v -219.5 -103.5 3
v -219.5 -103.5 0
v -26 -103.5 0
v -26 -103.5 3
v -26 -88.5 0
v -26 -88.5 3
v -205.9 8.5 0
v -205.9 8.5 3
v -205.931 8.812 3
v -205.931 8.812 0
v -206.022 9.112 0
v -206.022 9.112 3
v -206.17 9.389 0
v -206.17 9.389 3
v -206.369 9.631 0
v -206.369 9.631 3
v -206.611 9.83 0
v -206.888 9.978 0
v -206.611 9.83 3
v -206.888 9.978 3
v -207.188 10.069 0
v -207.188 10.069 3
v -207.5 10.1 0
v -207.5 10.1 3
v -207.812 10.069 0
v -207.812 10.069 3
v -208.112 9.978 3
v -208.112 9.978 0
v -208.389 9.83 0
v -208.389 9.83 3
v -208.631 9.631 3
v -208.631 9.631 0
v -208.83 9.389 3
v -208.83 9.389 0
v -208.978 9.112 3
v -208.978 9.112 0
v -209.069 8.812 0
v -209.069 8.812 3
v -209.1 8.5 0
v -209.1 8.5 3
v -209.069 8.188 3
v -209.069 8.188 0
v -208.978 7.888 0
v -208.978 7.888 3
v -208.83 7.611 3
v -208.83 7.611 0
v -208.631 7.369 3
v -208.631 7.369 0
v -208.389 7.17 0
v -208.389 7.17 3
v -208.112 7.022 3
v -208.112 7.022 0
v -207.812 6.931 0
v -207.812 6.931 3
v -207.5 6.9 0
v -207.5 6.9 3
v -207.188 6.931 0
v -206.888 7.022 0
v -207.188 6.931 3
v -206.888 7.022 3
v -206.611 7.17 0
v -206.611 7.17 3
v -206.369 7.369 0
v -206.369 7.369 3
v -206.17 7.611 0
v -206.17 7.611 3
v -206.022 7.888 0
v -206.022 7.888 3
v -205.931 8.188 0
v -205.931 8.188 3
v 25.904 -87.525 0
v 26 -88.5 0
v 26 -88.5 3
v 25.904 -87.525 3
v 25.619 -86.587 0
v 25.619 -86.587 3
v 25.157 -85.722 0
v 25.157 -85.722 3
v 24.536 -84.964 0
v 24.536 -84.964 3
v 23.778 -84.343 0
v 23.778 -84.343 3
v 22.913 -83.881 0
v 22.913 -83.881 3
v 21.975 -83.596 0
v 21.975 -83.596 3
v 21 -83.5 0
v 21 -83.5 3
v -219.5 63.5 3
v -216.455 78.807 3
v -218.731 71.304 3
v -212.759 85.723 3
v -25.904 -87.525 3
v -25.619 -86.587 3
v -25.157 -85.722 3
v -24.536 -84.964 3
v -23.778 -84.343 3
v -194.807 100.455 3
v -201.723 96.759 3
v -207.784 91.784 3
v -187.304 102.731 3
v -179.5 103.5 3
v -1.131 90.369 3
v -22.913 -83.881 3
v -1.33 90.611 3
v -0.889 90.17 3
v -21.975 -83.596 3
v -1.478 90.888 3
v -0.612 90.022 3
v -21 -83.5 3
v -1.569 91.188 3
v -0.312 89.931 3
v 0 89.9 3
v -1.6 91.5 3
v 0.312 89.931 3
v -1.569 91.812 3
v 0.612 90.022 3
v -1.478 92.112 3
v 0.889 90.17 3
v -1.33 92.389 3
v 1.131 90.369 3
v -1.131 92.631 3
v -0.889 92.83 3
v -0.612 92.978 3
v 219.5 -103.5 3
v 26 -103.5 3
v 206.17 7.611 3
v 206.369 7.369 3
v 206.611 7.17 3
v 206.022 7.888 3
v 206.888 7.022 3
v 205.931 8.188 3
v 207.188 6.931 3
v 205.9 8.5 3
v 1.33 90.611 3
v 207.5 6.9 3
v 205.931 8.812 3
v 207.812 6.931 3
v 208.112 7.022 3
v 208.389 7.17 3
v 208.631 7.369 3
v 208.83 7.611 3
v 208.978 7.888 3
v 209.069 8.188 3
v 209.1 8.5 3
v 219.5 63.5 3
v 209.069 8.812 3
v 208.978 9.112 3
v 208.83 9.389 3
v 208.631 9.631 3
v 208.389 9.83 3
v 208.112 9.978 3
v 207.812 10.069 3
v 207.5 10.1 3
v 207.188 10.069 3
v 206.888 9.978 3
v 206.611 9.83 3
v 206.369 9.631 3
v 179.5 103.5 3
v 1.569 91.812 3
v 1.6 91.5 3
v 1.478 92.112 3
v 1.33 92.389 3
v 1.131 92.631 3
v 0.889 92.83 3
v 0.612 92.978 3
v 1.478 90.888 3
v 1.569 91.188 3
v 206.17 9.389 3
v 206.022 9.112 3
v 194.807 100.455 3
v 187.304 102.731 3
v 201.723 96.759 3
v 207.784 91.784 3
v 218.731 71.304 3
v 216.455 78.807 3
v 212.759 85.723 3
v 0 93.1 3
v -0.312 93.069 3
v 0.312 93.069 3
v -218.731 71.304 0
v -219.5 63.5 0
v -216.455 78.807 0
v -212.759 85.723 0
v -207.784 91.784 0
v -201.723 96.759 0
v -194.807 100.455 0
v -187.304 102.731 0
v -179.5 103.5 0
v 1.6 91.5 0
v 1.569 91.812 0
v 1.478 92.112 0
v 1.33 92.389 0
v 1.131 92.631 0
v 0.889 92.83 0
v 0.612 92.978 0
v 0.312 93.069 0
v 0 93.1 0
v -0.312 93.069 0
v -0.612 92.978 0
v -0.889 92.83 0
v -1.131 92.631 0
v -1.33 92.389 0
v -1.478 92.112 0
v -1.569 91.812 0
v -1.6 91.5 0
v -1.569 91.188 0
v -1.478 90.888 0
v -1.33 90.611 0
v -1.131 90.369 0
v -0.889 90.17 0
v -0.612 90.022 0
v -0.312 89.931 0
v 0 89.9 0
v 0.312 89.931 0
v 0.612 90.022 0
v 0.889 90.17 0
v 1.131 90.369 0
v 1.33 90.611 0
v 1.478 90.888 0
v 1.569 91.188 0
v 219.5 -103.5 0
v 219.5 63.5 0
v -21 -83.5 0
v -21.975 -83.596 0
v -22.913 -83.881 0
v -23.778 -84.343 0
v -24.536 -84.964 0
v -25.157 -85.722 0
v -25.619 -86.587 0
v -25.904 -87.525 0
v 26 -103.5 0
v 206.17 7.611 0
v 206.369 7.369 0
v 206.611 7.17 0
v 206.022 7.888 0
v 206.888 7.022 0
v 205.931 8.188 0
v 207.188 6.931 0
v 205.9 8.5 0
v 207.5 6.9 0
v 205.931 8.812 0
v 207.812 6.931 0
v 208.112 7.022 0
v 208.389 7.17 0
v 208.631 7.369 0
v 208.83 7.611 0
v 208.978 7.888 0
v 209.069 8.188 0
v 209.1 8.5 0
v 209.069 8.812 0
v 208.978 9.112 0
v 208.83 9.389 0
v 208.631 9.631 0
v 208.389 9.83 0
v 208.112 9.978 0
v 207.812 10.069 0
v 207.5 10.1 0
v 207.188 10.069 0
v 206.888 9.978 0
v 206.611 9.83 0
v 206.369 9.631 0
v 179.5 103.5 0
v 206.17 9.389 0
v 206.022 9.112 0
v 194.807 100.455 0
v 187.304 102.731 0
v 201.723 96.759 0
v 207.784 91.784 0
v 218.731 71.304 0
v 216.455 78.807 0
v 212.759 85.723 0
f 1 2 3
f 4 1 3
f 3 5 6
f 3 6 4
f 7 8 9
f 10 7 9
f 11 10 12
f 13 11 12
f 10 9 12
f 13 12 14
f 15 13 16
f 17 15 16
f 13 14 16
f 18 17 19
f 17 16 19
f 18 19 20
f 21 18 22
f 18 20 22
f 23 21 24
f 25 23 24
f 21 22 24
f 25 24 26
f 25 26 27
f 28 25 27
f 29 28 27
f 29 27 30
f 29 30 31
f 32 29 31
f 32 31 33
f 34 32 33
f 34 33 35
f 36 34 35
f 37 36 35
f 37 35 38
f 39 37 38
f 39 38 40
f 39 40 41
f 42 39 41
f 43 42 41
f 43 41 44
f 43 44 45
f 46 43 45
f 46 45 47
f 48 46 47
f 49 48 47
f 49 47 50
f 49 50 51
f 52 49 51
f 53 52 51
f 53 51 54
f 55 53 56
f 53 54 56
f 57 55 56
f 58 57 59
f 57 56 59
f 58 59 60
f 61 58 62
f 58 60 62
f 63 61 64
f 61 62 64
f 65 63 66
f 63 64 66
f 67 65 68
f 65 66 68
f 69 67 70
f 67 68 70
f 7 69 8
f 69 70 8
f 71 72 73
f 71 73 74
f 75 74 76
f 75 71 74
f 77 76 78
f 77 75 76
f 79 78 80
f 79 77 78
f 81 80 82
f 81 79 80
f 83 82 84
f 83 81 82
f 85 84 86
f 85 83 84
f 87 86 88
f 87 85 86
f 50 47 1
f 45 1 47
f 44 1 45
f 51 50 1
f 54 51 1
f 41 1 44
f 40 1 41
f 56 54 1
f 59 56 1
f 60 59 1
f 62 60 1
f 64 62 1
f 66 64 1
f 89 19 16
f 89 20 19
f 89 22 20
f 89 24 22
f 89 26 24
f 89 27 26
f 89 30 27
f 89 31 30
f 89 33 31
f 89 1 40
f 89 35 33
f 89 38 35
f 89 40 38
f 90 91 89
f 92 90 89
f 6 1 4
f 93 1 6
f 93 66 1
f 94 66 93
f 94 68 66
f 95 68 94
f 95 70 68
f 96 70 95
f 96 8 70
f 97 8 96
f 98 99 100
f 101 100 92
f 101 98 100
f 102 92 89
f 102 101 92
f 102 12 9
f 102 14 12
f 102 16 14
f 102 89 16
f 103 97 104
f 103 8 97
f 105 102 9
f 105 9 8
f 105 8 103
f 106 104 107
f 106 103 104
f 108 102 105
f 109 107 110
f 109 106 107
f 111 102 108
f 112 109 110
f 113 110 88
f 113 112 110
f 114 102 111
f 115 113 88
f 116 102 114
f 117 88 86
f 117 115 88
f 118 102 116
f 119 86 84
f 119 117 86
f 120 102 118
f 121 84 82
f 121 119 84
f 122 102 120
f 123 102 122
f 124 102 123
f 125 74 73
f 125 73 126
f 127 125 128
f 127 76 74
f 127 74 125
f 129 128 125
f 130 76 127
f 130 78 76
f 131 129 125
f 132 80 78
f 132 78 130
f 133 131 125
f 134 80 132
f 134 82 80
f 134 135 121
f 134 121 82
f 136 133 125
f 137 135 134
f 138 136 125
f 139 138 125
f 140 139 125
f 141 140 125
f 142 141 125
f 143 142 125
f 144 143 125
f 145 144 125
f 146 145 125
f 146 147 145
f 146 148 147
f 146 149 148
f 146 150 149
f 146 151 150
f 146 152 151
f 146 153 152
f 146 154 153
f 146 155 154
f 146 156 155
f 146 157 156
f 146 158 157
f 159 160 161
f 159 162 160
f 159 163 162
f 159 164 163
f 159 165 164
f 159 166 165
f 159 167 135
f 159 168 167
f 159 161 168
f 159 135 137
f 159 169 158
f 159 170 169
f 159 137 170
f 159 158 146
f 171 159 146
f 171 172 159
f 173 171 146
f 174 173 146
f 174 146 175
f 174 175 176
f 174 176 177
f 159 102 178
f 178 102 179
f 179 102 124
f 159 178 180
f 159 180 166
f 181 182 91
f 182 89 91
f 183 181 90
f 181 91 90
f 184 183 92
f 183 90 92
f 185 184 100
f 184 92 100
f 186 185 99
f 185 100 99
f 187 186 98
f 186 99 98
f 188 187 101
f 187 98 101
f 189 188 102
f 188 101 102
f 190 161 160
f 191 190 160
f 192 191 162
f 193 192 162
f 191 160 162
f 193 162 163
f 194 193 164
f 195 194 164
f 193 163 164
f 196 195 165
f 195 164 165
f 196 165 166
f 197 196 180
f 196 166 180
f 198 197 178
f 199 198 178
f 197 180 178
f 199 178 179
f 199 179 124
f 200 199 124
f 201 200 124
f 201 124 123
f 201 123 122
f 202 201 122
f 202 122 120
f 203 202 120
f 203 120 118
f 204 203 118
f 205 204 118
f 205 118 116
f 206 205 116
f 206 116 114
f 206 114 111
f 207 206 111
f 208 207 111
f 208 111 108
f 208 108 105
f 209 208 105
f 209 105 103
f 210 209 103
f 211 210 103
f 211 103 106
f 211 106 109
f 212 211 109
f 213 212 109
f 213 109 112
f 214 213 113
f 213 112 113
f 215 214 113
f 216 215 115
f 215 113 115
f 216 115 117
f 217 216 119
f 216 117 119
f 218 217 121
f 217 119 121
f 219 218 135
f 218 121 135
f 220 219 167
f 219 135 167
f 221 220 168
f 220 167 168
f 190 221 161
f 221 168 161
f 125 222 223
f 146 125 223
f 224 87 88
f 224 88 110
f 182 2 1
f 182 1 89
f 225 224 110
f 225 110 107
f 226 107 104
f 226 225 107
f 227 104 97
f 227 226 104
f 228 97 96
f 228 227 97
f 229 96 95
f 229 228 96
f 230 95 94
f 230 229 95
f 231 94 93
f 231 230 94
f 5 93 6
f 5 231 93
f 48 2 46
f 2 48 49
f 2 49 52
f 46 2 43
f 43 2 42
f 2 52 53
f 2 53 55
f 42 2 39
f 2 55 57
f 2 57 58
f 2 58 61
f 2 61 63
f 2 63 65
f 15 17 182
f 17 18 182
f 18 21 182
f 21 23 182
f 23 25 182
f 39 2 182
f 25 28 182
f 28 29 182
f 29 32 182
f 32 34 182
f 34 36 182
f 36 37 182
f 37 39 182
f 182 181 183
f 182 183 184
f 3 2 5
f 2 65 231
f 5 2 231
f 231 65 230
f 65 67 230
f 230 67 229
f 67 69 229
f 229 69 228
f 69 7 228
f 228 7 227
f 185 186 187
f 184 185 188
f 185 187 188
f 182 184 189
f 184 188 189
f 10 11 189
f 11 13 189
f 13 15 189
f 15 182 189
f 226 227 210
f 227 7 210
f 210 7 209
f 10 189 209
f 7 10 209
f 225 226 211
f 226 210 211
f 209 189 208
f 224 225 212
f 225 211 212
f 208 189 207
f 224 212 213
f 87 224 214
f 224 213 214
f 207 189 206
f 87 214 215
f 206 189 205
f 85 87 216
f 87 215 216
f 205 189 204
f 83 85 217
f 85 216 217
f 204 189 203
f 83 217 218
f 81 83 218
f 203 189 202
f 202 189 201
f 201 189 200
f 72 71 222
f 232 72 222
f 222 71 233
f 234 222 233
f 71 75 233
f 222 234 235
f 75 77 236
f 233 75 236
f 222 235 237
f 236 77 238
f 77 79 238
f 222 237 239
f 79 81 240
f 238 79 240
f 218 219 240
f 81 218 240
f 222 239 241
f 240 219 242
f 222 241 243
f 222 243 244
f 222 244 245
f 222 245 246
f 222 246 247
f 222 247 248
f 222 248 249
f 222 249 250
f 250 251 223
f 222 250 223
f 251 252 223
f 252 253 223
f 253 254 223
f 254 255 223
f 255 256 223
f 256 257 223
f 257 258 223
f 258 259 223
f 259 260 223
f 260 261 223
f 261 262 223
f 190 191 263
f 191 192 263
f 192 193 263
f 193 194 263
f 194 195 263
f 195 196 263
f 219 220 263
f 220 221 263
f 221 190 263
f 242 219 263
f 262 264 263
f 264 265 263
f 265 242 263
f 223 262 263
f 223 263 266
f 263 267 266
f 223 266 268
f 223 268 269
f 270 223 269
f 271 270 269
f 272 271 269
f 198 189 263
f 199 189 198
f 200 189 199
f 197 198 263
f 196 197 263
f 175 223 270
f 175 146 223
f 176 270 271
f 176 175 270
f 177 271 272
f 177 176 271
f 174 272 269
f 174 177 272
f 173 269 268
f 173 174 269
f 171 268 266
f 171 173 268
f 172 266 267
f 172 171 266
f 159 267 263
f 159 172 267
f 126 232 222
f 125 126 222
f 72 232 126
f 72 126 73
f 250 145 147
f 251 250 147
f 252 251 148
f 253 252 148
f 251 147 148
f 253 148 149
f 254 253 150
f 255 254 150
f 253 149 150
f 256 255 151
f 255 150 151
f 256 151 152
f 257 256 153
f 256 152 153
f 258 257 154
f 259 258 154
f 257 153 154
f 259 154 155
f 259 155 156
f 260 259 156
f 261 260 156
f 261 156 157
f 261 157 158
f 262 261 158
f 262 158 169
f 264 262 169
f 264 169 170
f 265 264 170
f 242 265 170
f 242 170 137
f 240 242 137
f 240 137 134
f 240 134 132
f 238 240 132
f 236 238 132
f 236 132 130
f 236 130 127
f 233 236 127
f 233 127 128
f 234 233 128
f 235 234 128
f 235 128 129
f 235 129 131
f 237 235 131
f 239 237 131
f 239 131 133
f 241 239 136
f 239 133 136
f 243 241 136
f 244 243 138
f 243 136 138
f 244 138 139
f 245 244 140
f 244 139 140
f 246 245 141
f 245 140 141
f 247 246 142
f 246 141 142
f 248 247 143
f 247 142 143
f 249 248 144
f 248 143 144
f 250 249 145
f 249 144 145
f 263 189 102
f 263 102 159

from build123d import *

# Parameters (mm, degrees)
SKETCH1_W           = 439
SKETCH1_H           = 207
BOSS_EXTRUDE1_DEPTH = 3
FILLET1_R           = 40
CUT_EXTRUDE1_DEPTH  = 243.696312292
SKETCH3_R           = 1.6
CUT_EXTRUDE2_DEPTH  = 243.696312292
SKETCH4_R           = 1.6
CUT_EXTRUDE3_DEPTH  = 243.696312292


with BuildPart() as part:
    # Sketch1 → Boss-Extrude1 (new body)
    with BuildSketch(Plane.XY):
        Rectangle(SKETCH1_W, SKETCH1_H)
    extrude(amount=BOSS_EXTRUDE1_DEPTH)

    # Fillet1
    fillet1_edges = [part.edges().sort_by_distance(p)[0] for p in [
        (-219.5, 103.5, 1.5),
        (219.5, 103.5, 1.5),
    ]]
    fillet(fillet1_edges, radius=FILLET1_R)

    # Sketch2 → Cut-Extrude1 (cut, through all)
    with BuildSketch(Plane(origin=(0, 0, 0), x_dir=(-1, 0, 0), z_dir=(0, 0, -1))):
        with BuildLine():
            Line((-21, -83.5), (21, -83.5))
            ThreePointArc((21, -83.5), (24.535533906, -84.964466094), (26, -88.5))
            Line((26, -88.5), (26, -103.5))
            Line((26, -103.5), (-26, -103.5))
            Line((-26, -103.5), (-26, -88.5))
            ThreePointArc((-26, -88.5), (-24.535533906, -84.964466094), (-21, -83.5))
        make_face()
    extrude(amount=-CUT_EXTRUDE1_DEPTH, mode=Mode.SUBTRACT)

    # Sketch3 → Cut-Extrude2 (cut, through all)
    with BuildSketch(Plane.XY.offset(3)):
        with Locations((-207.5, 8.5)):
            Circle(SKETCH3_R)
        with Locations((207.5, 8.5)):
            Circle(SKETCH3_R)
    extrude(amount=-CUT_EXTRUDE2_DEPTH, mode=Mode.SUBTRACT)

    # Sketch4 → Cut-Extrude3 (cut, through all)
    with BuildSketch(Plane.XY.offset(3)):
        with Locations((0, 91.5)):
            Circle(SKETCH4_R)
    extrude(amount=-CUT_EXTRUDE3_DEPTH, mode=Mode.SUBTRACT)


solid = part.part
